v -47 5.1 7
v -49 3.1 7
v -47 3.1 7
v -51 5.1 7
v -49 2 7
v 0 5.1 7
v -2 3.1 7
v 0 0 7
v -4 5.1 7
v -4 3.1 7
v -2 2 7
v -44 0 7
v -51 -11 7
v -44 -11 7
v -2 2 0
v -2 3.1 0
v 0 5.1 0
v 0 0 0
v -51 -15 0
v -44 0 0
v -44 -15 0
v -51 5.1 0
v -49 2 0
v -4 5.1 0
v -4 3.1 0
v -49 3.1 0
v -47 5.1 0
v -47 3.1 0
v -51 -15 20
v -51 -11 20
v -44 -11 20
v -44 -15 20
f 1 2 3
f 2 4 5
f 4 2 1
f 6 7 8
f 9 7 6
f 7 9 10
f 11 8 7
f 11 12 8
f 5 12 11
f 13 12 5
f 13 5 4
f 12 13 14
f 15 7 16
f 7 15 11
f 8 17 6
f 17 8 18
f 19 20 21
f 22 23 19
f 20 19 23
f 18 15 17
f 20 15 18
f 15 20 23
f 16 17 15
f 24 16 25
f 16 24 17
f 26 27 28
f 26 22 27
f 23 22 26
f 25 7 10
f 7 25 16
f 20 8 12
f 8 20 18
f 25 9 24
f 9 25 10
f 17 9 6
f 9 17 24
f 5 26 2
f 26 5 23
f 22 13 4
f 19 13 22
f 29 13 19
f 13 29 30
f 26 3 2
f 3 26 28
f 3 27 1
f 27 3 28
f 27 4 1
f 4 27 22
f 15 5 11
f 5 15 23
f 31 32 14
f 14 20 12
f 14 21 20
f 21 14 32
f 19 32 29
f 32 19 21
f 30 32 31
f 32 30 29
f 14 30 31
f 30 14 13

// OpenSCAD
nub_length = 15;
wall_thickness = 2;
metal_thickness = 1;
gap = 0.1;
metal_gap = metal_thickness + gap;
width = 7;
lip_length = 2;
wall_height = 51;
trap_width = 20;
trap_thickness = 5;

module lip_wrap() {
  union() {
    cube([width, metal_gap + wall_thickness, wall_thickness]);

    translate([0, metal_gap + wall_thickness, 0])
      cube([width, lip_length, wall_thickness * 2]);
  }
}

rotate([0, -90, 0]) {
  union() {
    cube([width, wall_thickness, wall_height]);

    translate([0, 0 - nub_length, wall_height - width])
      cube([width, nub_length, width]);

    lip_wrap();

    translate([width, 0, wall_height])
      rotate([180, 0, 180])
        lip_wrap();

    translate([0, - nub_length, wall_height - width])
      cube([trap_width, 4, width]);
  }
}
